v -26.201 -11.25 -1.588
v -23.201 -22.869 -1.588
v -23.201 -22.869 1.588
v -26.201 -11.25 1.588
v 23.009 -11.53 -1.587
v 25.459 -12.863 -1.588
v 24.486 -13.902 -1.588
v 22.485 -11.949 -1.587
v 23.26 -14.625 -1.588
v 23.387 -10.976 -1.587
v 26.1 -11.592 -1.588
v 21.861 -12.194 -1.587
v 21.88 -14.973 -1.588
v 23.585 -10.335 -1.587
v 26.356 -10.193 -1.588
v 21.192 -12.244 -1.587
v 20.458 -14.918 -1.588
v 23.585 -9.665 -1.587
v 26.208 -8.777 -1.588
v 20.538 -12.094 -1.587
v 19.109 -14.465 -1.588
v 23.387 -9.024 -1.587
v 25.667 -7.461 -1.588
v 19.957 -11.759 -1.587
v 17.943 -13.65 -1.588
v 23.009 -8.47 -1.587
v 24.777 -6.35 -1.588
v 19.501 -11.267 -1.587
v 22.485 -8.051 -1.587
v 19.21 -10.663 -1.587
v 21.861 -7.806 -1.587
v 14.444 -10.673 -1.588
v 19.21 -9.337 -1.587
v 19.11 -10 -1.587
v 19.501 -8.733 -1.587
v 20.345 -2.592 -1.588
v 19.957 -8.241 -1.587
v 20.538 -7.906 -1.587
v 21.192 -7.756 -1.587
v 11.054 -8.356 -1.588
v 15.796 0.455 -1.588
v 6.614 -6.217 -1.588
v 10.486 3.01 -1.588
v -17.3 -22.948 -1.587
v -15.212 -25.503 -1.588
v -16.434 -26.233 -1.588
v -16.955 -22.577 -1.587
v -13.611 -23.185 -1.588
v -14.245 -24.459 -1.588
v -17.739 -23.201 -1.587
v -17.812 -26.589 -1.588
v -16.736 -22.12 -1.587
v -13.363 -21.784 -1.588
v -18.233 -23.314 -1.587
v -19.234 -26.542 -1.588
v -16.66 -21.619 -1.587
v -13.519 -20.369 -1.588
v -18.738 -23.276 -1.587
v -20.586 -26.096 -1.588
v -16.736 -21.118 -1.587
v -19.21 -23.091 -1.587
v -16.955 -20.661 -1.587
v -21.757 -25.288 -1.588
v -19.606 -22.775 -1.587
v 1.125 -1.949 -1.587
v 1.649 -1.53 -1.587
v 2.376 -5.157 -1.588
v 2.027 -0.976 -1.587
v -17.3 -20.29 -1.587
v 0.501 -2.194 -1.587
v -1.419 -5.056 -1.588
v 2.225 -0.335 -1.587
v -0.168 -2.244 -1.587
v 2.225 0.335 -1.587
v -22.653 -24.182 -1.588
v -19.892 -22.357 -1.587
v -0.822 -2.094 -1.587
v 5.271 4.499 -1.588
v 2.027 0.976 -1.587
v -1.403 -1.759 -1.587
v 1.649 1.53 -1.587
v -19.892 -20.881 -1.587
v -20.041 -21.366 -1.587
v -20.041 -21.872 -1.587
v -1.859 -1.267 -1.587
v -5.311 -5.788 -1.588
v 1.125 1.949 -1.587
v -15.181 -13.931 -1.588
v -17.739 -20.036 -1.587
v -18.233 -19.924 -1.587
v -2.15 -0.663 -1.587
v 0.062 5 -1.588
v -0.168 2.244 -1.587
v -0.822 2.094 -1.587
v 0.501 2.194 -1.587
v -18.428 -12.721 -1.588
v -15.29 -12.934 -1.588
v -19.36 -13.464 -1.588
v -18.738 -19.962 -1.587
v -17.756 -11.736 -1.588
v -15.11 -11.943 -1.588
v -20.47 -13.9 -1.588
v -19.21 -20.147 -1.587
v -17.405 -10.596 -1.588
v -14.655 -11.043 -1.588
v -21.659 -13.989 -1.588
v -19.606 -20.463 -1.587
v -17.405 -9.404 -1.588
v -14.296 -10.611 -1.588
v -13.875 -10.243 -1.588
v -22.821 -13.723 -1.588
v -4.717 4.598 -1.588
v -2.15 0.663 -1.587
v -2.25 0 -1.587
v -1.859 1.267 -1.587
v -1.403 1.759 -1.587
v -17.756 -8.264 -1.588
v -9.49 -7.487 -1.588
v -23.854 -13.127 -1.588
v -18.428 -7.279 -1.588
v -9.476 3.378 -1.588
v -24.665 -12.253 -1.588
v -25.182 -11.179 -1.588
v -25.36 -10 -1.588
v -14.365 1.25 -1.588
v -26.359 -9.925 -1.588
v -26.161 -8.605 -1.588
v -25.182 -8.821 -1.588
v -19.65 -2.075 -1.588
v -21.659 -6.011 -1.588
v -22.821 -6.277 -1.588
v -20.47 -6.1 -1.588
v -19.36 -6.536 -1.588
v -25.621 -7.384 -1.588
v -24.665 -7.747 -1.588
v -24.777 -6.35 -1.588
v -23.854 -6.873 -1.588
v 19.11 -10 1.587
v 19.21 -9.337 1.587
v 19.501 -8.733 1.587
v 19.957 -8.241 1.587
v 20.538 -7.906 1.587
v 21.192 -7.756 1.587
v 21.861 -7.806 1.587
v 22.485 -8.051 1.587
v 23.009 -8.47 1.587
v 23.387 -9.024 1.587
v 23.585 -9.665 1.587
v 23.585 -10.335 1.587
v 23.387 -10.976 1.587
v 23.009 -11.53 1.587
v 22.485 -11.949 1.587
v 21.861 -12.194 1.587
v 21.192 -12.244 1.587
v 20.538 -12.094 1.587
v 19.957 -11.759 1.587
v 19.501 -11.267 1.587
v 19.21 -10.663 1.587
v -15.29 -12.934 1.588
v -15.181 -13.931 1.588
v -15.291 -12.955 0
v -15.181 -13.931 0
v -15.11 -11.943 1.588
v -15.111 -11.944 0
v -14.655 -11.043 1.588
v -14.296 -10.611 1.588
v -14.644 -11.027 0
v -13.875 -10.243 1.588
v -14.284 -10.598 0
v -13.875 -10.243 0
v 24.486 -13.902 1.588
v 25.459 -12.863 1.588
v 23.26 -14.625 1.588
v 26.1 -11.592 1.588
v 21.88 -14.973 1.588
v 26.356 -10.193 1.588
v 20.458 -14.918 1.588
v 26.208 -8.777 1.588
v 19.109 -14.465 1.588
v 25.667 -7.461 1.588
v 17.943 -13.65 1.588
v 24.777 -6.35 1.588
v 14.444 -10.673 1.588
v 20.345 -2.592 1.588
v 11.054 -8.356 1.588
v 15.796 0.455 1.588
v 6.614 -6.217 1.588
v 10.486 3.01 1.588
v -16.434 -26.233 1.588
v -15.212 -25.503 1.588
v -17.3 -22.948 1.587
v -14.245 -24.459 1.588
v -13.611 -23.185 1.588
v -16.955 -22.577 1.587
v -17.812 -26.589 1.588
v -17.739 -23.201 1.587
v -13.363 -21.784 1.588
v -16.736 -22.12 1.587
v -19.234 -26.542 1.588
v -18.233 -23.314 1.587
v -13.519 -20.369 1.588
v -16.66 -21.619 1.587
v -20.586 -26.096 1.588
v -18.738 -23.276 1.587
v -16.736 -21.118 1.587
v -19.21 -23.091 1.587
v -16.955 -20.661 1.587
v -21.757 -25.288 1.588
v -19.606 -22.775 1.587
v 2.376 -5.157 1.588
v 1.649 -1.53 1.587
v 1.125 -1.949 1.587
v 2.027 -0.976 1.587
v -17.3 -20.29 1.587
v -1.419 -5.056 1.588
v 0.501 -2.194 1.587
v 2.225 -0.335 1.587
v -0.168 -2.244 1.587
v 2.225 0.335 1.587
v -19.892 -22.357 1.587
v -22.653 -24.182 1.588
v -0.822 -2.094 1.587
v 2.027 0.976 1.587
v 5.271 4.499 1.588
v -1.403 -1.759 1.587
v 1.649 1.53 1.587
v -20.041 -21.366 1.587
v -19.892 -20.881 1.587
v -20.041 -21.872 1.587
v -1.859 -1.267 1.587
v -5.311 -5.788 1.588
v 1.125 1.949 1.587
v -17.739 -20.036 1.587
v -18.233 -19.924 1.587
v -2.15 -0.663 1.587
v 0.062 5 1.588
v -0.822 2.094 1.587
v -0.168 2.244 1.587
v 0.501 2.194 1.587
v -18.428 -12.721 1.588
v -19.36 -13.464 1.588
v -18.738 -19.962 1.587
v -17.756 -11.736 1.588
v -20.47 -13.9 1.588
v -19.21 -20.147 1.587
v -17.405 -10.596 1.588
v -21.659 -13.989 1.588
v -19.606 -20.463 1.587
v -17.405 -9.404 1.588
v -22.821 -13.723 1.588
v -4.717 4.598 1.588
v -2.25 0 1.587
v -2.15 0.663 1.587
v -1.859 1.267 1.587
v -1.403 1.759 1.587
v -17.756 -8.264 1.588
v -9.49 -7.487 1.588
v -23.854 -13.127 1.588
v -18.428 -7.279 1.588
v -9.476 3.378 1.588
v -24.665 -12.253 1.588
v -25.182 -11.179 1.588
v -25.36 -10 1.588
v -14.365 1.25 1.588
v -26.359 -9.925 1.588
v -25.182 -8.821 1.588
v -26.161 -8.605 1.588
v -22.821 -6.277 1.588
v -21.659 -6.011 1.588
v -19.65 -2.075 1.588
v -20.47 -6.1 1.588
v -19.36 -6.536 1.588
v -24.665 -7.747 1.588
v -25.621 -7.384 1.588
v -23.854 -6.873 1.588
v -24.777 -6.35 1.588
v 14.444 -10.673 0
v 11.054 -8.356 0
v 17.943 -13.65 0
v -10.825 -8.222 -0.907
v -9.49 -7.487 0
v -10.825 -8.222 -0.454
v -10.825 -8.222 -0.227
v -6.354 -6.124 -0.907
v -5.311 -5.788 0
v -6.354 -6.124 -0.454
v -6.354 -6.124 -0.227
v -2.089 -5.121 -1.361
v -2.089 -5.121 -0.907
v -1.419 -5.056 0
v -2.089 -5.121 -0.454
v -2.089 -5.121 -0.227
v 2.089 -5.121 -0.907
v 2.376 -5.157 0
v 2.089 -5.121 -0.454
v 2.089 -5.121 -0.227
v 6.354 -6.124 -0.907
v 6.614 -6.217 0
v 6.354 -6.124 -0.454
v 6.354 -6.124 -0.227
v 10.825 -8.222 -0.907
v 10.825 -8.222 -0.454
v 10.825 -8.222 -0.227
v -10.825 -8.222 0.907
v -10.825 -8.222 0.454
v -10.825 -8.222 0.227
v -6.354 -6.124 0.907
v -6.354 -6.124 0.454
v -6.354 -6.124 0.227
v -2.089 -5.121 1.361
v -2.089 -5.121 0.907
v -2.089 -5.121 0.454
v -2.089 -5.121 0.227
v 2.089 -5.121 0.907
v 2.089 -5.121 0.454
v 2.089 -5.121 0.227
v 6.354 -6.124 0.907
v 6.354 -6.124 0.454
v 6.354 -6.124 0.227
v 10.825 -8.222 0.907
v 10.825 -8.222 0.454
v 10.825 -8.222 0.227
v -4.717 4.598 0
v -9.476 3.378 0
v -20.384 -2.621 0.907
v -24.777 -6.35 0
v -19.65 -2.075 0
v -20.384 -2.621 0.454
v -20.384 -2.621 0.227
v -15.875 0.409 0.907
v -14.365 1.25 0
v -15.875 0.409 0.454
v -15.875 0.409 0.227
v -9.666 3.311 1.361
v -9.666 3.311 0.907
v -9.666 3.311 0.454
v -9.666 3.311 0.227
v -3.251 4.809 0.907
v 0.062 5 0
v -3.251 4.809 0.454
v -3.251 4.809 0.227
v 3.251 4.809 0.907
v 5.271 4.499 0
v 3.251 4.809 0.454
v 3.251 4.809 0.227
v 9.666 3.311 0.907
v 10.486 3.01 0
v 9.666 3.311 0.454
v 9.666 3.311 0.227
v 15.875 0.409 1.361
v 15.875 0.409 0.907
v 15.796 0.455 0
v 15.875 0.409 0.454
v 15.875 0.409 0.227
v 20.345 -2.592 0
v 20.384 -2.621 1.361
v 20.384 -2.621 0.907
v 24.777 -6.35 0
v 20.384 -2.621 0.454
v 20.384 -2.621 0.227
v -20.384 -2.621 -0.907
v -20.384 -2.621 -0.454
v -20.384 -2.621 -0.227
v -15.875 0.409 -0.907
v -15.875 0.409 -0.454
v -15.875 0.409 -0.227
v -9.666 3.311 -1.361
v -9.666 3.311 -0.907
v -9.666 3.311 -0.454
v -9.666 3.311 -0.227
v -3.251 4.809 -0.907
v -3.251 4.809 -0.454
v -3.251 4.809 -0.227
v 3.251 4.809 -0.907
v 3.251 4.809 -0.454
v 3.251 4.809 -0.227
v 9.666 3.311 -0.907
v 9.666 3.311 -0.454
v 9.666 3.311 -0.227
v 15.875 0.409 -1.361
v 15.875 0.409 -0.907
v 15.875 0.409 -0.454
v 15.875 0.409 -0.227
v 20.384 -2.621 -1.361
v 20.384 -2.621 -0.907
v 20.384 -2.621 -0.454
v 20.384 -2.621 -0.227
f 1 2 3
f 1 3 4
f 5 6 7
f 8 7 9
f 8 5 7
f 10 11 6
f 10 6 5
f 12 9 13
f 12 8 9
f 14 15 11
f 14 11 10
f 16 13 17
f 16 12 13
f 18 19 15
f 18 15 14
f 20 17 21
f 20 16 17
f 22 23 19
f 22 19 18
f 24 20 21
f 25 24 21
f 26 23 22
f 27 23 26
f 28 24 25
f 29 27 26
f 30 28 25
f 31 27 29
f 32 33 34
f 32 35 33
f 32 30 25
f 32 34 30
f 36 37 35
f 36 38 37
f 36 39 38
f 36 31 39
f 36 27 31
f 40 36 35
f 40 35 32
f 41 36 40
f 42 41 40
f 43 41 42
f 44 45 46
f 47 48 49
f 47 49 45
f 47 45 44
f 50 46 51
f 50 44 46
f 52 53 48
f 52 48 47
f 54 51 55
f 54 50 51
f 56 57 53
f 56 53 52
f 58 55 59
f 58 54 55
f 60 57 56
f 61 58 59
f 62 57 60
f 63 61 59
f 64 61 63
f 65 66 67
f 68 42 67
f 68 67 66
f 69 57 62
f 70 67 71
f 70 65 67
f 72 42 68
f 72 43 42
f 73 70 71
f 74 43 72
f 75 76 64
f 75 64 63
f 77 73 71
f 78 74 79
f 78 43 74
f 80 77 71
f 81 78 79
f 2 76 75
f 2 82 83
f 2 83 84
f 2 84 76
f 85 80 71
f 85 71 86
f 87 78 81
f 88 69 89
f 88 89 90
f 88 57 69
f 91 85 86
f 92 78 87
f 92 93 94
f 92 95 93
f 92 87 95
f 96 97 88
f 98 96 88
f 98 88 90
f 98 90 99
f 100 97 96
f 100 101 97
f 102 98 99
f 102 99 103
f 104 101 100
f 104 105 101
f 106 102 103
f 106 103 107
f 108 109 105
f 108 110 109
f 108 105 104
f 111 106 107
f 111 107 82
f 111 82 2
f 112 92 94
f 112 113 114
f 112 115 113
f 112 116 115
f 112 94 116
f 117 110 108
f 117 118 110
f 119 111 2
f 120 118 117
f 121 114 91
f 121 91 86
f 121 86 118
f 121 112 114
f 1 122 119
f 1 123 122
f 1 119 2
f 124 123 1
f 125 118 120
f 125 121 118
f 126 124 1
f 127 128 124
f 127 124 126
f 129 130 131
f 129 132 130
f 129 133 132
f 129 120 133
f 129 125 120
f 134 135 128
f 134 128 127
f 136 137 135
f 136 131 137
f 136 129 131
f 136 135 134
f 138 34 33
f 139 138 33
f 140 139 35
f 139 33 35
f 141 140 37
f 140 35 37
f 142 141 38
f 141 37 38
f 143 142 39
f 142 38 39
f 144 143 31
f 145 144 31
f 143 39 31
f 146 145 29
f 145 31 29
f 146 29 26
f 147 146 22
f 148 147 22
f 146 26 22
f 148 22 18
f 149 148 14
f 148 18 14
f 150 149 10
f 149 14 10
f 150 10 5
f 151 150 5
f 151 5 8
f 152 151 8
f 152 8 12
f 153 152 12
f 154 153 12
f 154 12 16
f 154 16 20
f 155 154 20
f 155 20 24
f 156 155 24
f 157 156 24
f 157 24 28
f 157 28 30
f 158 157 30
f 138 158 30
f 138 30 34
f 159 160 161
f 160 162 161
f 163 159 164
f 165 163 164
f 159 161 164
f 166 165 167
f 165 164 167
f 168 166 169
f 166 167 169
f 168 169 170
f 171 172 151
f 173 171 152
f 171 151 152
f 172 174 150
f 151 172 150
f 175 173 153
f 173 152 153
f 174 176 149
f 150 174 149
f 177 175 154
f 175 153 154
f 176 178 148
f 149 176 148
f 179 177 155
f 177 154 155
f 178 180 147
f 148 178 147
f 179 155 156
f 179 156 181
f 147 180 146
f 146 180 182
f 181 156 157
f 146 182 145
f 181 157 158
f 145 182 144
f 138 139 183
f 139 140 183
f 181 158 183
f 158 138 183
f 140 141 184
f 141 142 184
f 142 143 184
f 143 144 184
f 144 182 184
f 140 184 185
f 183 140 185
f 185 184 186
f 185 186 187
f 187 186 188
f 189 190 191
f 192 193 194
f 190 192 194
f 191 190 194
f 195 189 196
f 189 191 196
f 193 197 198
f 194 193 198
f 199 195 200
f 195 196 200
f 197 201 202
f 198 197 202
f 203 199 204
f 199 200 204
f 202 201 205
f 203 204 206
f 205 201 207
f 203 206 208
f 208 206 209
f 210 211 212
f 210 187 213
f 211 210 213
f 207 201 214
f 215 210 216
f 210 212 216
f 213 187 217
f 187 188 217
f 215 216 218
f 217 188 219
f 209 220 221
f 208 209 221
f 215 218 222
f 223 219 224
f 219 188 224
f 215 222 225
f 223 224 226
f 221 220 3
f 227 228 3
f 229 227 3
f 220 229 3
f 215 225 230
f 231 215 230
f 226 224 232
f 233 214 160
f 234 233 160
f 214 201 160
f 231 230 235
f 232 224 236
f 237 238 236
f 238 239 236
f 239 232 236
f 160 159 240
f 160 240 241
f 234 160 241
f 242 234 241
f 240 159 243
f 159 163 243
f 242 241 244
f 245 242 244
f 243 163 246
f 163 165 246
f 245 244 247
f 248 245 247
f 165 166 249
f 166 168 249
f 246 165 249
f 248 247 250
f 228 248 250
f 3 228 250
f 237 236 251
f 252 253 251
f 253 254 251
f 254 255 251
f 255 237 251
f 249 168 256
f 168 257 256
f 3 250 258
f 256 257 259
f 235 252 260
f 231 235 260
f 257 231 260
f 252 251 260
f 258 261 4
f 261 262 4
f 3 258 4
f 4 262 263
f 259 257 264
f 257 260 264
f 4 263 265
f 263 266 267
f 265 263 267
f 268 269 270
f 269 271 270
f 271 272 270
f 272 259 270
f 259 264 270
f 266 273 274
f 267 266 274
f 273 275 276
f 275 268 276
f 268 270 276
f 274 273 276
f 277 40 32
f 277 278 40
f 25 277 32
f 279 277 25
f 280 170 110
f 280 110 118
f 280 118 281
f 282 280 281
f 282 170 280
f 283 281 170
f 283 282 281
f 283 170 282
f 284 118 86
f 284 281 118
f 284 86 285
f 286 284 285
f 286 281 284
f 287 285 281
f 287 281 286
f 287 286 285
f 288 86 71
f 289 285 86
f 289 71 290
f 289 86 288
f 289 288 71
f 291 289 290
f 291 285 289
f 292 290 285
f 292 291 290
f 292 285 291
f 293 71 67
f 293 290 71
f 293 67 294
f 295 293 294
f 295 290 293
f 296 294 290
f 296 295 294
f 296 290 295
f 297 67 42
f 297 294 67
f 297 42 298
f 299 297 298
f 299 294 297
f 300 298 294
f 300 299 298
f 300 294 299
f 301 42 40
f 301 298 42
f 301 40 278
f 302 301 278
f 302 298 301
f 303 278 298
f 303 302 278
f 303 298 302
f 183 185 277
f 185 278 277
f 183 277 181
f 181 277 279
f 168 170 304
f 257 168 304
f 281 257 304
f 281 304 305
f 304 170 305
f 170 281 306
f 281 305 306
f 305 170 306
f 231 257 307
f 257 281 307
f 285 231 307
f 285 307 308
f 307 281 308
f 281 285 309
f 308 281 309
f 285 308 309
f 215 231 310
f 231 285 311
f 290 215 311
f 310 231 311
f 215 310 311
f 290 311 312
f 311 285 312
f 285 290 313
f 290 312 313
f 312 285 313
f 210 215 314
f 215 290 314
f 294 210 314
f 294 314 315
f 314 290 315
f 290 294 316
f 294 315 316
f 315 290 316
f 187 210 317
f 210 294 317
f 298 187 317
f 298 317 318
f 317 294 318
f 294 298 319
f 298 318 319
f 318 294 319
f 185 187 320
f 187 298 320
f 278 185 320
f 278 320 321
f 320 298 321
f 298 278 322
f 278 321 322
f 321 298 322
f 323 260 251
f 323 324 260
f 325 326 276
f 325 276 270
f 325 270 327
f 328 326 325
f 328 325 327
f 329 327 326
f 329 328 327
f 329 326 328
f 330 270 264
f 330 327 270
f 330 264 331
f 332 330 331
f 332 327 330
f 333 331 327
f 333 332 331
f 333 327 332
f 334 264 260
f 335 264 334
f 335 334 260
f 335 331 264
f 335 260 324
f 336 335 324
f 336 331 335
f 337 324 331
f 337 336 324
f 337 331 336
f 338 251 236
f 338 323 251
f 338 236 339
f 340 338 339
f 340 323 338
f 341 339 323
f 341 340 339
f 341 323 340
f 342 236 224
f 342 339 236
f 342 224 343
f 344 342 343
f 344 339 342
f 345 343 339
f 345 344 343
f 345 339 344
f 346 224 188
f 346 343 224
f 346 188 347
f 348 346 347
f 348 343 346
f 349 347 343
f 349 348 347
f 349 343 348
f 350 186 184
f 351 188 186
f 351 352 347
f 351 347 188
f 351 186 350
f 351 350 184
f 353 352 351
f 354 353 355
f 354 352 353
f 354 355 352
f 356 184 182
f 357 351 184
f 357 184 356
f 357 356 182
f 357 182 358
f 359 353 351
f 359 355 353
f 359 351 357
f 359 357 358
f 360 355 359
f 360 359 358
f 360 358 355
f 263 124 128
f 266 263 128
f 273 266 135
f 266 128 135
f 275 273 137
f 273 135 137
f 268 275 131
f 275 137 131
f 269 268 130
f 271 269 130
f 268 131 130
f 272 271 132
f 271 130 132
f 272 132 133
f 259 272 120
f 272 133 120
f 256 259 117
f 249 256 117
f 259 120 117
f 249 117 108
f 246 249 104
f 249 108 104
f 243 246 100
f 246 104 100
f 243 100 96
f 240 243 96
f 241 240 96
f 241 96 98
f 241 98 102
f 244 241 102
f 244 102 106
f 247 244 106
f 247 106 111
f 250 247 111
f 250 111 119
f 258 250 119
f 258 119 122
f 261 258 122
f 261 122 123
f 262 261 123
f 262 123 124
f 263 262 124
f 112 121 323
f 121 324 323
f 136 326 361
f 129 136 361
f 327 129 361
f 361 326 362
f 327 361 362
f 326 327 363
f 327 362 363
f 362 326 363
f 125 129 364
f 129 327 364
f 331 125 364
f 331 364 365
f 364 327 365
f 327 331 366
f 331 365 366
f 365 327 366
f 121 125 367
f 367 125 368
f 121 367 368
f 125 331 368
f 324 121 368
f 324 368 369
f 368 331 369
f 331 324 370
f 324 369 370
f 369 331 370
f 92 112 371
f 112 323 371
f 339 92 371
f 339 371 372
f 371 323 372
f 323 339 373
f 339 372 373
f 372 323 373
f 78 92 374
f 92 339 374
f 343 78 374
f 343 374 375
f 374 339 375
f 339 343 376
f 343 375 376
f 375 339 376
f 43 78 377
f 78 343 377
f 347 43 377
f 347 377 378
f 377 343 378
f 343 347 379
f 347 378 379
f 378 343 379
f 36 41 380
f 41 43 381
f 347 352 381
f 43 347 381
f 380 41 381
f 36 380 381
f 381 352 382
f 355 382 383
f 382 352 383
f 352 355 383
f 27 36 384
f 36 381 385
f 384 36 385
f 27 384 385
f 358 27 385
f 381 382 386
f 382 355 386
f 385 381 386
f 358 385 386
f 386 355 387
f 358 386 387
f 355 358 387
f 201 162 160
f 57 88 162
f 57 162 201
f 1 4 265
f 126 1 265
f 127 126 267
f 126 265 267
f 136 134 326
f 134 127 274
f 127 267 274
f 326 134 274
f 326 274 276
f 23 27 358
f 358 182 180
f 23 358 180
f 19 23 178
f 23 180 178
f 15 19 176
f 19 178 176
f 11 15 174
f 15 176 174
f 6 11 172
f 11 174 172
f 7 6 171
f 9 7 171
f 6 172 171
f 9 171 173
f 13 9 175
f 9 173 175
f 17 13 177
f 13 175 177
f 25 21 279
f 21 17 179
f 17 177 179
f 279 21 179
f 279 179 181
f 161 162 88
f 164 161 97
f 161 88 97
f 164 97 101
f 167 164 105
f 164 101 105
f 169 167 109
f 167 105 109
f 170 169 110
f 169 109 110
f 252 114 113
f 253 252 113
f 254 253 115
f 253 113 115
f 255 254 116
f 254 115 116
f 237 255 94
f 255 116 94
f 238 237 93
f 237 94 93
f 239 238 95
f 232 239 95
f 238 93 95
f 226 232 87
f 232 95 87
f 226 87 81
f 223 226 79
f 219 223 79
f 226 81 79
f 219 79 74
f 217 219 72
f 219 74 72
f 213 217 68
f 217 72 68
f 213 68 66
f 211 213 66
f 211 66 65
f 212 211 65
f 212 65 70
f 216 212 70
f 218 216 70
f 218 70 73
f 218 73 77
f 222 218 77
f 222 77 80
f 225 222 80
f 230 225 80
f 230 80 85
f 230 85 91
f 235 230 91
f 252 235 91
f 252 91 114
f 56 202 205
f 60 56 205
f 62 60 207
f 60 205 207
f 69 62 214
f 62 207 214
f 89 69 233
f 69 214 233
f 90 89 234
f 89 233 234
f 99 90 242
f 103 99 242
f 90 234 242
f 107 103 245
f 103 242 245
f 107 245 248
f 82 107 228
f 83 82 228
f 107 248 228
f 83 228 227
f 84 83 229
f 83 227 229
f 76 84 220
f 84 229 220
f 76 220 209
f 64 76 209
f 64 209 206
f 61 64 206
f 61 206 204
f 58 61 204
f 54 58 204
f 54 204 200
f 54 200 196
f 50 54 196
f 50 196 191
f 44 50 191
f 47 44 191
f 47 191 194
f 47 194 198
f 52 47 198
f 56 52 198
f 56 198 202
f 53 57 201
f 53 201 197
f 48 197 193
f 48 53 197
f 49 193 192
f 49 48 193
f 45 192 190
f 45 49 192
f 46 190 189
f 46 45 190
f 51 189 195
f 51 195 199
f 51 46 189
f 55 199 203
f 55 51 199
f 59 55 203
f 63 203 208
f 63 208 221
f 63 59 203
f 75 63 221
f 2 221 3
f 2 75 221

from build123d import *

# Parameters (mm, degrees)
BOSS_EXTRUDE1_DEPTH  = 1.5875
M4_CLEARANCE_HOLE1_D = 4.5
BOSS_EXTRUDE2_DEPTH  = 3.175
FILLET1_R            = 3.5
M3_CLEARANCE_HOLE1_D = 3.4
SKETCH8_R            = 4
CUT_EXTRUDE1_DEPTH   = 4.1750001


with BuildPart() as part:
    # Sketch2 → Boss-Extrude1 (new body, symmetric)
    with BuildSketch(Plane.XY):
        with BuildLine():
            ThreePointArc((-17.942568571, -13.649816766), (-25.009816766, -13.417431429), (-24.777431429, -6.350183234))
            add(Edge.make_bspline(
                [(-24.777431429, -6.350183234), (-20.441430485, -2.271315687), (-12.829947979, 2.196277878), (-6.501150321, 4.42663028), (0, 5.19112324), (6.501150321, 4.42663028), (12.829947979, 2.196277878), (20.441430485, -2.271315687), (24.777431429, -6.350183234)],
                knots=[0, 0, 0, 0.1875, 0.3125, 0.4375, 0.5625, 0.6875, 0.8125, 1, 1, 1], degree=2))
            ThreePointArc((24.777431429, -6.350183234), (25.009816766, -13.417431429), (17.942568571, -13.649816766))
            add(Edge.make_bspline(
                [(-17.942568571, -13.649816766), (-14.268569515, -10.228684313), (-8.530052021, -6.883777878), (-4.178849679, -5.36413028), (0, -4.87862324), (4.178849679, -5.36413028), (8.530052021, -6.883777878), (14.268569515, -10.228684313), (17.942568571, -13.649816766)],
                knots=[0, 0, 0, 0.1875, 0.3125, 0.4375, 0.5625, 0.6875, 0.8125, 1, 1, 1], degree=2))
        make_face()
    extrude(amount=BOSS_EXTRUDE1_DEPTH, both=True)

    # M4 Clearance Hole1 (through all)
    with Locations(Plane.XY.offset(1.5875)):
        with Locations((21.36, -10), (0, 0)):
            Hole(M4_CLEARANCE_HOLE1_D / 2)

    # Sketch5 → Boss-Extrude2 (add)
    with BuildSketch(Plane(origin=(0, 0, -1.5875), x_dir=(-1, 0, 0), z_dir=(0, 0, -1))):
        with BuildLine():
            ThreePointArc((13.518770817, -20.368950039), (17.11, -26.460179221), (23.201229183, -22.868950039))
            Line((23.201229183, -22.868950039), (26.201229183, -11.25))
            ThreePointArc((26.201229183, -11.25), (22.61, -5.158770817), (16.518770817, -8.75))
            Line((16.518770817, -8.75), (13.518770817, -20.368950039))
        make_face()
    extrude(amount=-BOSS_EXTRUDE2_DEPTH)

    # Fillet1
    fillet1_edges = [part.edges().sort_by_distance(p)[0] for p in [
        (-15.752223744, -11.718824048, 0.7937488),
    ]]
    fillet(fillet1_edges, radius=FILLET1_R)

    # M3 Clearance Hole1 (through all)
    with Locations(Plane(origin=(0, 0, -1.5875), x_dir=(-1, 0, 0), z_dir=(0, 0, -1))):
        with Locations((18.36, -21.618950039)):
            Hole(M3_CLEARANCE_HOLE1_D / 2)

    # Sketch8 → Cut-Extrude1 (cut, through all)
    with BuildSketch(Plane(origin=(0, 0, -1.5875), x_dir=(-1, 0, 0), z_dir=(0, 0, -1))):
        with Locations((21.36, -10)):
            Circle(SKETCH8_R)
    extrude(amount=-CUT_EXTRUDE1_DEPTH, mode=Mode.SUBTRACT)


solid = part.part
